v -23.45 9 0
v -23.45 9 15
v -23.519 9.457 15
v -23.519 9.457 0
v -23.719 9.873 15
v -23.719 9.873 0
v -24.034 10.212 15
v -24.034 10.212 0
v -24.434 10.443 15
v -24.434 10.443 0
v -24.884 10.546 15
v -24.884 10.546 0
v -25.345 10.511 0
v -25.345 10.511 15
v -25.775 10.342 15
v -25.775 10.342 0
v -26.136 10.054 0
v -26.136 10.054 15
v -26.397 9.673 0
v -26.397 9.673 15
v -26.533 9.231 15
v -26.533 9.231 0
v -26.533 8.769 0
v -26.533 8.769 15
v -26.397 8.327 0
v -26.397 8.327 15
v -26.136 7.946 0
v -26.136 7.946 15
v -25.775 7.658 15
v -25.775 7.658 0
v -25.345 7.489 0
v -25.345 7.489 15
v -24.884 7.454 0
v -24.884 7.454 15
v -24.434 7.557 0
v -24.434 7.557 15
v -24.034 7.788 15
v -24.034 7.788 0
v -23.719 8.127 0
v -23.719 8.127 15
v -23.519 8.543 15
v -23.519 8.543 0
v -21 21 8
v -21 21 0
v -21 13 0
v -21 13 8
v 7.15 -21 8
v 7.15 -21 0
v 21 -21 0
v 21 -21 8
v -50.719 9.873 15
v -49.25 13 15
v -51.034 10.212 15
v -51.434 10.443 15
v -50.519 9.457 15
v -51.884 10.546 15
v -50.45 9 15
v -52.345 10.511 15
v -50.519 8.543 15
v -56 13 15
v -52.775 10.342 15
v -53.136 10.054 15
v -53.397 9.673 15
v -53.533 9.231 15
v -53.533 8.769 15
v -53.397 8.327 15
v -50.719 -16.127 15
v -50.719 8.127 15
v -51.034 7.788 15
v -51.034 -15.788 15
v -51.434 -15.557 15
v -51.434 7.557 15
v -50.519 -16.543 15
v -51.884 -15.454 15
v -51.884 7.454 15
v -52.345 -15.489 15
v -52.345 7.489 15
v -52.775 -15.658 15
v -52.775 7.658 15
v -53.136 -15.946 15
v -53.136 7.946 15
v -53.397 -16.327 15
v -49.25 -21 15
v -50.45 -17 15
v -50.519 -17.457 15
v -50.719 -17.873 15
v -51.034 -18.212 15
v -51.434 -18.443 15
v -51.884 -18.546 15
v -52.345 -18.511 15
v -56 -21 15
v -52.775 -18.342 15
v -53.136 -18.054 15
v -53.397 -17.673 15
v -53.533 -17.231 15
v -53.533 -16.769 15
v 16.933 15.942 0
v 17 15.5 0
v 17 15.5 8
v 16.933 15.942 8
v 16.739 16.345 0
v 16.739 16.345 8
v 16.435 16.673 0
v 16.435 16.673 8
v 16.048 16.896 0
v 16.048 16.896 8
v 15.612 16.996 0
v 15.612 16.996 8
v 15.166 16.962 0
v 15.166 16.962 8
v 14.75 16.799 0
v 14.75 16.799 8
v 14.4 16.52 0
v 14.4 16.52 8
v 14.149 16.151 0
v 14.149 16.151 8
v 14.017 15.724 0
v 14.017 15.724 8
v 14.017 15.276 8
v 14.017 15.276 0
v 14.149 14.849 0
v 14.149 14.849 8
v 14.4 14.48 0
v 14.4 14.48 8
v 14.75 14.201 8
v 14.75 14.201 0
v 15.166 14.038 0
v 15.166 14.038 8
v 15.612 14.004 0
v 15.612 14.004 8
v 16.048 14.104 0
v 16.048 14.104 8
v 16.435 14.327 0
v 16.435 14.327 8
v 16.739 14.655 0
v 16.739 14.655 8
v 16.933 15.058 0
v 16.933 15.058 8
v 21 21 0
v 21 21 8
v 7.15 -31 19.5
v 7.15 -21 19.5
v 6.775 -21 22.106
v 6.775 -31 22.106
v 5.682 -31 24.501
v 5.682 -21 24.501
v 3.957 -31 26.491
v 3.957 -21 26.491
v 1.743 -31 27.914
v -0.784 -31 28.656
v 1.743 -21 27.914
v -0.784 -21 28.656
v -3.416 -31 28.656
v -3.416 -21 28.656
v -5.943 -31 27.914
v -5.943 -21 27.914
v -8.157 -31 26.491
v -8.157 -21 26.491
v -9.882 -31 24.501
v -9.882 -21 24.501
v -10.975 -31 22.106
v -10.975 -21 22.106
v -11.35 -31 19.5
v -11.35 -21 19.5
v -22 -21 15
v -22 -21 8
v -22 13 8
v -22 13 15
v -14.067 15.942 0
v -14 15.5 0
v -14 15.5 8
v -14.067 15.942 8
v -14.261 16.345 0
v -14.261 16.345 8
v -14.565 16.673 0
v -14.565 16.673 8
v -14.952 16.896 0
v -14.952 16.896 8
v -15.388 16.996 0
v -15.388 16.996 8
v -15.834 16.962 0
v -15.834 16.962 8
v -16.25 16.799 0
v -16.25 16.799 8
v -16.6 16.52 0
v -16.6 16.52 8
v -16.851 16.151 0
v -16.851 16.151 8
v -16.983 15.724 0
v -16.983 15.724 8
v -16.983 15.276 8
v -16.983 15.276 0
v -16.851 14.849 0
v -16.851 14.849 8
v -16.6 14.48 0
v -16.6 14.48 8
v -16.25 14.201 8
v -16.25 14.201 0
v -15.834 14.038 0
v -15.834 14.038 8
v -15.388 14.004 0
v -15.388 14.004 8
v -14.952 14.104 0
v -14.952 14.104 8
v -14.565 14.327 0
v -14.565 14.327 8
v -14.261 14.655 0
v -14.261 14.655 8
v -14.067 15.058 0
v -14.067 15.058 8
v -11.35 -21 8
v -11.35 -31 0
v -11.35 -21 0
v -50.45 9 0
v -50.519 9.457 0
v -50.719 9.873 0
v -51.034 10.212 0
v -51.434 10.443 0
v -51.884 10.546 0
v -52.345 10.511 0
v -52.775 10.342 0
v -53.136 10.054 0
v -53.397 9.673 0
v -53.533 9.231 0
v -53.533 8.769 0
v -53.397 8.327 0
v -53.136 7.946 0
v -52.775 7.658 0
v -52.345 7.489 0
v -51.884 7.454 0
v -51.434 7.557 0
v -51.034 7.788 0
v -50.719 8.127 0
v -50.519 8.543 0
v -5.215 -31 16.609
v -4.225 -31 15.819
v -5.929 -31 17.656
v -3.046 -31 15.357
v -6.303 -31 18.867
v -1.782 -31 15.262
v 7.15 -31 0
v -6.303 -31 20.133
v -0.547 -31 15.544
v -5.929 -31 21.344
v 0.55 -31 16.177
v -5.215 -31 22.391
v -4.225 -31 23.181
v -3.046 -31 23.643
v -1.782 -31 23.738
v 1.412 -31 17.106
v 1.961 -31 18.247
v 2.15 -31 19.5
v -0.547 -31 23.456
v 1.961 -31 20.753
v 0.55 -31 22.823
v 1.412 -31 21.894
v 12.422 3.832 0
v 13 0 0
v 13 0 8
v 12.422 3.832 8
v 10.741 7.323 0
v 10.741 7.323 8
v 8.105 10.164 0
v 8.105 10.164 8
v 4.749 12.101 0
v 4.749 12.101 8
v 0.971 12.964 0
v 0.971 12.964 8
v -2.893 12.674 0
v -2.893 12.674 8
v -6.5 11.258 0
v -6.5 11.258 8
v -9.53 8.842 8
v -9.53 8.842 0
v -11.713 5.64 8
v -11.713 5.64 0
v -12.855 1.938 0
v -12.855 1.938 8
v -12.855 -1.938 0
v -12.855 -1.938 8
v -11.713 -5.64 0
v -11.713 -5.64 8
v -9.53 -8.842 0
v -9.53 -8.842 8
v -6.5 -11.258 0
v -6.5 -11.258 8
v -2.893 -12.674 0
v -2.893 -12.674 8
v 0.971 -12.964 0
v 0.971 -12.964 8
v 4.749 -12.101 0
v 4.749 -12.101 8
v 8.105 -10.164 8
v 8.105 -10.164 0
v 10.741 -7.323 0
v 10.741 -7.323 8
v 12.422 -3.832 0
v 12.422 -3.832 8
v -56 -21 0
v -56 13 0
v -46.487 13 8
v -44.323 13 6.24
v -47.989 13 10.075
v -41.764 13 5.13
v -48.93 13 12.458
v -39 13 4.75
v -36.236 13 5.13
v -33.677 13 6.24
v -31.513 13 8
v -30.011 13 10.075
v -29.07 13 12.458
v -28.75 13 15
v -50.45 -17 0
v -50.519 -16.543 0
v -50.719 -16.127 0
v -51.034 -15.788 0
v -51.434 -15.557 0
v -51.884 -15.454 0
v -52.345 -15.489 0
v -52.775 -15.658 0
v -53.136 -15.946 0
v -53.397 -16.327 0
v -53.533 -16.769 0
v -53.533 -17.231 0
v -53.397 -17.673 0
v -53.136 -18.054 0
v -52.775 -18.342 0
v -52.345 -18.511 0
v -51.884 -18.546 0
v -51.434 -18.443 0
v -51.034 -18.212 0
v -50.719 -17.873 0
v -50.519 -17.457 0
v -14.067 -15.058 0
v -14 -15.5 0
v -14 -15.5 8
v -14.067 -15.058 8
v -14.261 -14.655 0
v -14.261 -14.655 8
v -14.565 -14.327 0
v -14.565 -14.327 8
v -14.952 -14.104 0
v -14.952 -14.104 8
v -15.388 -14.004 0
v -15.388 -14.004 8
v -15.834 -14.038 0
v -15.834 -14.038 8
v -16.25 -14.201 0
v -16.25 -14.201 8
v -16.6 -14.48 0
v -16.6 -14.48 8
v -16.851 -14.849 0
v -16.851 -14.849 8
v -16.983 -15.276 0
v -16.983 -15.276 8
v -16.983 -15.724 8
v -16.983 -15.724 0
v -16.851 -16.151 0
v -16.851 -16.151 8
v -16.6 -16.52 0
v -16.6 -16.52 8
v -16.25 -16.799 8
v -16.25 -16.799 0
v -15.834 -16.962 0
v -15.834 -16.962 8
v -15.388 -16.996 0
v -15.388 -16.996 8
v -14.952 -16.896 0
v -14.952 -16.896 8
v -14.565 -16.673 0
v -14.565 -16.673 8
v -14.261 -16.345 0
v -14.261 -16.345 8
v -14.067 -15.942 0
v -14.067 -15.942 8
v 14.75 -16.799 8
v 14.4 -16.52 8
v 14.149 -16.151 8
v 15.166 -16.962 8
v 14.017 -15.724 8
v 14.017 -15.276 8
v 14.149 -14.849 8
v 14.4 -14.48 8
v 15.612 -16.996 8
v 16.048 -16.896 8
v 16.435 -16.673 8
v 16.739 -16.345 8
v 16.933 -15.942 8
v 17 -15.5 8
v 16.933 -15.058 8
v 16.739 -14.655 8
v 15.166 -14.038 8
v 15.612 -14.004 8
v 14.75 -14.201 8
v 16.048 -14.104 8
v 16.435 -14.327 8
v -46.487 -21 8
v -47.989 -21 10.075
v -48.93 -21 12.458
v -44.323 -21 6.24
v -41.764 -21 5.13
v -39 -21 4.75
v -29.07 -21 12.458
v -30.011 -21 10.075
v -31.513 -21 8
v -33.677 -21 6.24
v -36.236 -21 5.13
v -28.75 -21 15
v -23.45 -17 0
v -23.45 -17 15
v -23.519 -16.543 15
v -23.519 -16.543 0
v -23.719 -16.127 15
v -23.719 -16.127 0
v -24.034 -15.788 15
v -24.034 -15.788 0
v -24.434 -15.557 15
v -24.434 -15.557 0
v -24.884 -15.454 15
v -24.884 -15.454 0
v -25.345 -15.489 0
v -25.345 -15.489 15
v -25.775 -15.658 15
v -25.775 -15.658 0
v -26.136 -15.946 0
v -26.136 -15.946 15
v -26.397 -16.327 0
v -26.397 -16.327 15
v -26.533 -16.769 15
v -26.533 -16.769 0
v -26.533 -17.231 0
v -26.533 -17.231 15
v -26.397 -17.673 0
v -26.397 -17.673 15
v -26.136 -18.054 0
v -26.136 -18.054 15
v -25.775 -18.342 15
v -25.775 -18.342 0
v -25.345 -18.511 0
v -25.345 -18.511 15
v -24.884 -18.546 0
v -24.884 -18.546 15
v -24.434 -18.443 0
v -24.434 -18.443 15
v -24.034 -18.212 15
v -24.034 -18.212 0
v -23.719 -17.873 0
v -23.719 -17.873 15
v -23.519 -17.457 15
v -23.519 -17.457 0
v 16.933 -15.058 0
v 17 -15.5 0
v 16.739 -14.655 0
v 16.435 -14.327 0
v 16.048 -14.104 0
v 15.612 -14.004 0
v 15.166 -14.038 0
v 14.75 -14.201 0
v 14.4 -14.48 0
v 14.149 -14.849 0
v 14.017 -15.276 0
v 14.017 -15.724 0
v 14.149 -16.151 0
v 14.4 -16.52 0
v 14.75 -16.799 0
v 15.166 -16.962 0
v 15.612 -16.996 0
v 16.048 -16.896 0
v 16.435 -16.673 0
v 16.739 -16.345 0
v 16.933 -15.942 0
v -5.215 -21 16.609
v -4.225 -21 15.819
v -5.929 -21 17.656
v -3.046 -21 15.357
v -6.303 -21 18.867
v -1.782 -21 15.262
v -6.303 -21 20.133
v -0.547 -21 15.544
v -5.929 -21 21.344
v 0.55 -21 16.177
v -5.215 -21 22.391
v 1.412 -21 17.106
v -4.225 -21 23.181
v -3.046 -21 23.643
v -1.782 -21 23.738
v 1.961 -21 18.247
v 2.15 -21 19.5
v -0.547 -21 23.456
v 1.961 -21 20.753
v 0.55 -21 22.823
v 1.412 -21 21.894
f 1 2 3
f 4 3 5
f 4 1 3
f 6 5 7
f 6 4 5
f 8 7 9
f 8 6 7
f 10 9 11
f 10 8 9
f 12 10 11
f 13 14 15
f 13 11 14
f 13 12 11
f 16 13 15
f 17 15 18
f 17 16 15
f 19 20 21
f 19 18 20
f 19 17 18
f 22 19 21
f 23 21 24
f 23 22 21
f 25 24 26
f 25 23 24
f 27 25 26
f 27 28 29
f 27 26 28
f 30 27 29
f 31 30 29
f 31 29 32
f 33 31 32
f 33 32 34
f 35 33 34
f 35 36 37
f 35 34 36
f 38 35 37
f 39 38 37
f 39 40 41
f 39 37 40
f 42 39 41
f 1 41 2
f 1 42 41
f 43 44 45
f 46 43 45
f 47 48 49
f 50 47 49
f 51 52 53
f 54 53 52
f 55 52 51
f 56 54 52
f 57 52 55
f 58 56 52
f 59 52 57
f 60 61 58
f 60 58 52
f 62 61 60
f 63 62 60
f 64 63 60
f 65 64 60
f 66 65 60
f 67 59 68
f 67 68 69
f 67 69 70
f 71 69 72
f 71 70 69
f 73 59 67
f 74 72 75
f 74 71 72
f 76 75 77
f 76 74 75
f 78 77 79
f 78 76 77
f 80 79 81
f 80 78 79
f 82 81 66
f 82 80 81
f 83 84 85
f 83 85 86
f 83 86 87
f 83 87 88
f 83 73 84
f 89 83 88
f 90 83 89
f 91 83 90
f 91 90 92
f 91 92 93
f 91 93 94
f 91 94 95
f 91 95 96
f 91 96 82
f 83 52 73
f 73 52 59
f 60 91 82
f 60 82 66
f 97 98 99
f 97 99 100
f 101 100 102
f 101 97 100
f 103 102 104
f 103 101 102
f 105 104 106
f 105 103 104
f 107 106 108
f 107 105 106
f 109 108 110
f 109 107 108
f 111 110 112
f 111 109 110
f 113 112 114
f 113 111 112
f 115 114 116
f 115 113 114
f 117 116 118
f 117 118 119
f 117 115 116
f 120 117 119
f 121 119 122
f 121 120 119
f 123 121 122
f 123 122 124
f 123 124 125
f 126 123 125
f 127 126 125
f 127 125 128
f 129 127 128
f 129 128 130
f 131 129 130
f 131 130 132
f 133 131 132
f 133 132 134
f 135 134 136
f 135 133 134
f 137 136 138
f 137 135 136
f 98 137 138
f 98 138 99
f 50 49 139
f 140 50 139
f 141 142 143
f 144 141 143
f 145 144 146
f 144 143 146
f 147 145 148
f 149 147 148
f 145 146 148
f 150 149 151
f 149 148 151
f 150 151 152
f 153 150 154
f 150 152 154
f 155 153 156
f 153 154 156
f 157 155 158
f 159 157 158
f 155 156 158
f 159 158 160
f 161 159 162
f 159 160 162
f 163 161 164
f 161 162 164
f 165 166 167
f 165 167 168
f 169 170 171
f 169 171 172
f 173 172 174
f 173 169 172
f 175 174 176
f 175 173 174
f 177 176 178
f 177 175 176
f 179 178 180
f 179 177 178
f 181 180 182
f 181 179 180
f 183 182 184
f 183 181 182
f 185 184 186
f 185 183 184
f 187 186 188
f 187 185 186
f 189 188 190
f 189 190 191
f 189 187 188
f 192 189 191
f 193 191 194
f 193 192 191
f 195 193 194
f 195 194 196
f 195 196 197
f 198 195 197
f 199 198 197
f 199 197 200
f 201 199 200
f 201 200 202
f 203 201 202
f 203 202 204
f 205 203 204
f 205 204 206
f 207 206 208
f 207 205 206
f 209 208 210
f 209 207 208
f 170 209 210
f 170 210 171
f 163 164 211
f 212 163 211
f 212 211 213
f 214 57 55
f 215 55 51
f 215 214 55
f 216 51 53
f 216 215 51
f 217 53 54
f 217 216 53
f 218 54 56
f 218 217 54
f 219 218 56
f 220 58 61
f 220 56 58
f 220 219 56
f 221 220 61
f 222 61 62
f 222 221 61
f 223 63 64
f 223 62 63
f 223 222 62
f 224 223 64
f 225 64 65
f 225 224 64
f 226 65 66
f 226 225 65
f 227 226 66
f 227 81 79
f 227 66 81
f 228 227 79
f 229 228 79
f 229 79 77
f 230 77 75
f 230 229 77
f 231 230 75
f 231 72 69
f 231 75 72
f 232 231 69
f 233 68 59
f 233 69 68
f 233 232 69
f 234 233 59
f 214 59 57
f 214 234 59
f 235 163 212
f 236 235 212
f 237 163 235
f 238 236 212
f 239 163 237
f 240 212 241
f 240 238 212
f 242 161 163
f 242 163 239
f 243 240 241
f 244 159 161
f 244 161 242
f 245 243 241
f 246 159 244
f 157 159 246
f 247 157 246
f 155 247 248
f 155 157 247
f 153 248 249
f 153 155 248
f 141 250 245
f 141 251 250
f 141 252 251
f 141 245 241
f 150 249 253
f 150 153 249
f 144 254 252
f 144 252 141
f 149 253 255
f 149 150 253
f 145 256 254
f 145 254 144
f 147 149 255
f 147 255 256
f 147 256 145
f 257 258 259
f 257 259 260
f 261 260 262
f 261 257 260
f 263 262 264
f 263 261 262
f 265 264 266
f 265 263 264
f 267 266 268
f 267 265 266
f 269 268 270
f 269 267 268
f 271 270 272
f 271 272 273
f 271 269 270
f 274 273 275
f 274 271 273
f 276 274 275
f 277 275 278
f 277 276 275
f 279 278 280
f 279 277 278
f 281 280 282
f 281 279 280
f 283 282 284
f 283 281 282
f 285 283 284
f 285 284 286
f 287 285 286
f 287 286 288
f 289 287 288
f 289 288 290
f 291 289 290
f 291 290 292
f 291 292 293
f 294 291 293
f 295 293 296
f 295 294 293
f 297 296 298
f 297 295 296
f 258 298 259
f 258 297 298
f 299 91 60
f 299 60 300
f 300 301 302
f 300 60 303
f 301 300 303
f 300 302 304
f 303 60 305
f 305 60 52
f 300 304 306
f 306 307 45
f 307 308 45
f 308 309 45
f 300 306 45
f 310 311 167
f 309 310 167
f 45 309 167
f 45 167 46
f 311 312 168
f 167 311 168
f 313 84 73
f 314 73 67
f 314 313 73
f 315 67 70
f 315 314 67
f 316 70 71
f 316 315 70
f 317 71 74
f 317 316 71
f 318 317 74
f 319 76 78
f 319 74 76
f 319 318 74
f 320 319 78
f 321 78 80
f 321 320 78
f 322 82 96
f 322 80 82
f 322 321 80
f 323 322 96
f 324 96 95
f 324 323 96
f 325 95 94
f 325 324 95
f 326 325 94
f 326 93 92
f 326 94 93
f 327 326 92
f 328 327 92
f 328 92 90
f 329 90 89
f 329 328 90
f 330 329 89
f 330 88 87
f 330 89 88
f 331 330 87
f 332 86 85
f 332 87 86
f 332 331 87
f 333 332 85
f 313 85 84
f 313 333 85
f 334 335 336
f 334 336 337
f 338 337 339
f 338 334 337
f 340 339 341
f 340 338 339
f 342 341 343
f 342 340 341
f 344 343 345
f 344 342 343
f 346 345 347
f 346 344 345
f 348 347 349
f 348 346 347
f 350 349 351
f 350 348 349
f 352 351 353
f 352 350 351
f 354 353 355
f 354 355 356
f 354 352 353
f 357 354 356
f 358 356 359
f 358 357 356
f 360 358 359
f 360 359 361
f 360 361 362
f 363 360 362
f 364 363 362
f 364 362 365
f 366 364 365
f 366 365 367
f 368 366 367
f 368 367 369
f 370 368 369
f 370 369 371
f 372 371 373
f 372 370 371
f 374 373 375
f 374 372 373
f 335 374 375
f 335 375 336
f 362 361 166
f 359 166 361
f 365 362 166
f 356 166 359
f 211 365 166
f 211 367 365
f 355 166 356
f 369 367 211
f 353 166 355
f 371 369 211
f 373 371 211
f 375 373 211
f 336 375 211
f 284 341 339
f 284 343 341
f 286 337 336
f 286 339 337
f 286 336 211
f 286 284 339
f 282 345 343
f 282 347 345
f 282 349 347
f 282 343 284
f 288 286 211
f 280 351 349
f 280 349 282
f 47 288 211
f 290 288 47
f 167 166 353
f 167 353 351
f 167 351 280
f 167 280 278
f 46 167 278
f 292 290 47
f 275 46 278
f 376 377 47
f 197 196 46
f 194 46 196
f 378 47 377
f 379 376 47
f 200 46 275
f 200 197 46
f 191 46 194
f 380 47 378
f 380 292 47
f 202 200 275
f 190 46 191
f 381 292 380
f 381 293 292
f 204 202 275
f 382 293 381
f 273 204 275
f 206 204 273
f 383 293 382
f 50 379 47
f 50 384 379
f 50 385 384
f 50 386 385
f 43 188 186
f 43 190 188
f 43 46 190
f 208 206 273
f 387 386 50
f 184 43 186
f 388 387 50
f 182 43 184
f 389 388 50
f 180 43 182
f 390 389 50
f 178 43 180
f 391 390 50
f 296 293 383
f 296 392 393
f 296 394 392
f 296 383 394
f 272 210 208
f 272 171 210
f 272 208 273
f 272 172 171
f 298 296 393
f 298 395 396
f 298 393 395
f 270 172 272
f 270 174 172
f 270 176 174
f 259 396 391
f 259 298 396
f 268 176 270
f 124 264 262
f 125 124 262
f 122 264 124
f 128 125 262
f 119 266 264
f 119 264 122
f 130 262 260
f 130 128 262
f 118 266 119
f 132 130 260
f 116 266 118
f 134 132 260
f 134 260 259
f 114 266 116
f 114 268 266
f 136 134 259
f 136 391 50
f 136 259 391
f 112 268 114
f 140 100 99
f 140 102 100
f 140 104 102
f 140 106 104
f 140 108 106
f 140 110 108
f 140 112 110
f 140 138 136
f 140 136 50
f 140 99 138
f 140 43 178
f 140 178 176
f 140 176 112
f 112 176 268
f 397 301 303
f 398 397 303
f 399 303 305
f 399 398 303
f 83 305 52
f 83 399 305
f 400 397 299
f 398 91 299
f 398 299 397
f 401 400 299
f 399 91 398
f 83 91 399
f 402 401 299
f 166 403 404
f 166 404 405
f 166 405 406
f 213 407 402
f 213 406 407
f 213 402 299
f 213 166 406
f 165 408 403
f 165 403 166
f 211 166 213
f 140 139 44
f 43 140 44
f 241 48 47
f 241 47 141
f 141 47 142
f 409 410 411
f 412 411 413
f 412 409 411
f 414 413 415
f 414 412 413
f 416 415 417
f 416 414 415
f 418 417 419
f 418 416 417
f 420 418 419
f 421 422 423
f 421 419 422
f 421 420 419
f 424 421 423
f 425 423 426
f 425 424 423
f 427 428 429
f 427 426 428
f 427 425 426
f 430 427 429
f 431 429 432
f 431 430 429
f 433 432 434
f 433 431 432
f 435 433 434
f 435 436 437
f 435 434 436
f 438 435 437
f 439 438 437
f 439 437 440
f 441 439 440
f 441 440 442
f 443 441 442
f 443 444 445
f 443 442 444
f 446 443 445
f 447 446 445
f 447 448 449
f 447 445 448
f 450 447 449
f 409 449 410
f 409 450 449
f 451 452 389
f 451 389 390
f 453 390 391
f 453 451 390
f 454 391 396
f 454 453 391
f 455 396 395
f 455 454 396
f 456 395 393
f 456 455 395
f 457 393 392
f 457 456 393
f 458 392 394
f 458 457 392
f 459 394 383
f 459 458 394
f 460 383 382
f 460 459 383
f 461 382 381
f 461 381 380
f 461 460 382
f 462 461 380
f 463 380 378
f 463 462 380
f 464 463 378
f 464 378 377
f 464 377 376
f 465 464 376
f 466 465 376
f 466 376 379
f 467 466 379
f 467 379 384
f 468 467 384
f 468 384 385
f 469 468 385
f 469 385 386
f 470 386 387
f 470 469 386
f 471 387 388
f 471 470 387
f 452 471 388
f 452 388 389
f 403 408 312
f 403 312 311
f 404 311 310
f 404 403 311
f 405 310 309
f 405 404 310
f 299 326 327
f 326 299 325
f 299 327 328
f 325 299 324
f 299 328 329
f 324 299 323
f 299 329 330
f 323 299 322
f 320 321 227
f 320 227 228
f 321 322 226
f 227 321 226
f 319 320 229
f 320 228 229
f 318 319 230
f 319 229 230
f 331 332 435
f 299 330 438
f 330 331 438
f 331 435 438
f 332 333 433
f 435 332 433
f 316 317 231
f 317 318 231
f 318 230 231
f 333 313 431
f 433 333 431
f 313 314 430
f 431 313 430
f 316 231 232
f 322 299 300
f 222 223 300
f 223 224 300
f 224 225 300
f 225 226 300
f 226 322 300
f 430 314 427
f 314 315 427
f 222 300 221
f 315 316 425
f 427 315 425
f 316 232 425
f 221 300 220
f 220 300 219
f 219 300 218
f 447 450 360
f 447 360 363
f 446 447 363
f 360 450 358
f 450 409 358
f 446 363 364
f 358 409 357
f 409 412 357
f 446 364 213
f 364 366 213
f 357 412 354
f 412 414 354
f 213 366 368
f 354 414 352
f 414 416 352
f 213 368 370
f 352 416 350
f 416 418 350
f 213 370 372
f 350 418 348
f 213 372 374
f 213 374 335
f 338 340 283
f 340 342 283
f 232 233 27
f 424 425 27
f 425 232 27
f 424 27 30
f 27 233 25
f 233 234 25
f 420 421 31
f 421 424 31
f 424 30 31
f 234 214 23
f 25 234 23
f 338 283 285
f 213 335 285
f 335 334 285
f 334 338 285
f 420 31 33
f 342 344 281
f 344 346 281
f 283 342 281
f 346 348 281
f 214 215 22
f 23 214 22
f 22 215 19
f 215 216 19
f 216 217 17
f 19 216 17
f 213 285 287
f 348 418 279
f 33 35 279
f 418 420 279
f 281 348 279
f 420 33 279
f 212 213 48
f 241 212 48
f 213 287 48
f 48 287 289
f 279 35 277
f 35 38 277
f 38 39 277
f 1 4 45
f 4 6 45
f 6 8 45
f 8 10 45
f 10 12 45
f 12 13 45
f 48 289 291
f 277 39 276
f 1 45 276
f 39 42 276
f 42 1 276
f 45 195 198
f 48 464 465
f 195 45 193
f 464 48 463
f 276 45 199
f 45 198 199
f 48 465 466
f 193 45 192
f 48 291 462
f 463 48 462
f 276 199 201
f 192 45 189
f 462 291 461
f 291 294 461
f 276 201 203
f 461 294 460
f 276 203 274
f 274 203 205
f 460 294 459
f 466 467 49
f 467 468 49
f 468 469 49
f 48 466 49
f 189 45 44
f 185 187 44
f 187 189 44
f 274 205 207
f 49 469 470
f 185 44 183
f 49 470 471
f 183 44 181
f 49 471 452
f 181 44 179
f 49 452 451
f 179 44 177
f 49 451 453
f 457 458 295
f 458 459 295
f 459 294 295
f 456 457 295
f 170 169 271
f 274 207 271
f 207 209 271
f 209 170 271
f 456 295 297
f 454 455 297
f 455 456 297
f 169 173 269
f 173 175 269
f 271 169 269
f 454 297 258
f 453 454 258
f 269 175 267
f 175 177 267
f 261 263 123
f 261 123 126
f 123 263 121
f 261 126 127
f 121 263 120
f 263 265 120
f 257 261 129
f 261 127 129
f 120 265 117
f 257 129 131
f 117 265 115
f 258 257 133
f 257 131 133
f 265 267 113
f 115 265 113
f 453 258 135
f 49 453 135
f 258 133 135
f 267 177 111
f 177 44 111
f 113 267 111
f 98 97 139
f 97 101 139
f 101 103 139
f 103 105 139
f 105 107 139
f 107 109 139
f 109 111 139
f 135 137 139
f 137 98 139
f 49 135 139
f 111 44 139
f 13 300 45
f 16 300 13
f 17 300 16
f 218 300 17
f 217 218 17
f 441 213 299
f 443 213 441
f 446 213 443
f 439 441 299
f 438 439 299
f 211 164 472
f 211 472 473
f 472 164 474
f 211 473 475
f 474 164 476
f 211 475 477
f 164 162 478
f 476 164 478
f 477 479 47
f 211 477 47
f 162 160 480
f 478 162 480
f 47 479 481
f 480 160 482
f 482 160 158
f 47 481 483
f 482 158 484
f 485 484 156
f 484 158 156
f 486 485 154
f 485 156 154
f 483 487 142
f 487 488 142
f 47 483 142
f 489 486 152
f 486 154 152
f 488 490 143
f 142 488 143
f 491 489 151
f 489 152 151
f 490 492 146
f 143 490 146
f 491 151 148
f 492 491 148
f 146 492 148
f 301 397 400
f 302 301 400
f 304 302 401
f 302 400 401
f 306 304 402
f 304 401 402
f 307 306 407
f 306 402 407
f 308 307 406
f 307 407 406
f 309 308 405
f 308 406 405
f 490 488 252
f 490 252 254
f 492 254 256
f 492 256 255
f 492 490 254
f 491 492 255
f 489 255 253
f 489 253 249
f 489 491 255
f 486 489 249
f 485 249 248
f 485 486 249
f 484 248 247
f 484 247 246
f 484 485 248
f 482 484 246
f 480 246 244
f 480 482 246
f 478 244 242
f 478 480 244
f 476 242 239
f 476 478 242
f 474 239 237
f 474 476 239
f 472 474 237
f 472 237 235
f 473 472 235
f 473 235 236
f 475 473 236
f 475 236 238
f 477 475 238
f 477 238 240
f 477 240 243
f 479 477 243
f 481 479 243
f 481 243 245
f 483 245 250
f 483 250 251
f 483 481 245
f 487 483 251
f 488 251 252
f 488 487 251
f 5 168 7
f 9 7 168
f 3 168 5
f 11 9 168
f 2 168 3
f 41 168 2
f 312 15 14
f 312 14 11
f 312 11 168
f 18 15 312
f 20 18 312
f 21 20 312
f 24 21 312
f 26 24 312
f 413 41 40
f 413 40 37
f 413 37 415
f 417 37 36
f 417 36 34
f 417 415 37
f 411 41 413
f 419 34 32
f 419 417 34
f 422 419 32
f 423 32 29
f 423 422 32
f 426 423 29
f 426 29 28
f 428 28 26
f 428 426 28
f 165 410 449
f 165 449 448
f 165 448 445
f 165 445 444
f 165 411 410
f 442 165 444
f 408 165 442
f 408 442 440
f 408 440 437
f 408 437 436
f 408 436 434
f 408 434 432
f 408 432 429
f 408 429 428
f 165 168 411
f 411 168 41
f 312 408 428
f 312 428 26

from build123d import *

# Parameters (mm, degrees)
F0_R     = 1.5
F0_R_2   = 13
F0_W     = 35
F0_H     = 34
F0_R_3   = 1.55
F1_DEPTH = 8
F2_W     = 18.5
F2_H     = 8
F2_R     = 4.25
F3_DEPTH = 10
F5_DEPTH = 34
F6_DEPTH = 42.001
F7_DEPTH = 28.751


with BuildPart() as f1:
    # F0 (on Top) → F1 (new body)
    with BuildSketch(Plane.XY):
        Polygon((21, 21), (-21, 21), (-21, 13), (-21, -21), (0, -21), (21, -21), (21, -16), align=None)
        with Locations((-15.5, -15.5)):
            Circle(F0_R, mode=Mode.SUBTRACT)
        with Locations((15.5, -15.5)):
            Circle(F0_R, mode=Mode.SUBTRACT)
        Circle(F0_R_2, mode=Mode.SUBTRACT)
        with Locations((-15.5, 15.5)):
            Circle(F0_R, mode=Mode.SUBTRACT)
        with Locations((15.5, 15.5)):
            Circle(F0_R, mode=Mode.SUBTRACT)
        with Locations((-38.5, -4)):
            Rectangle(F0_W, F0_H)
        with Locations((-52, -17)):
            Circle(F0_R_3, mode=Mode.SUBTRACT)
        with Locations((-25, -17)):
            Circle(F0_R_3, mode=Mode.SUBTRACT)
        with Locations((-52, 9)):
            Circle(F0_R_3, mode=Mode.SUBTRACT)
        with Locations((-25, 9)):
            Circle(F0_R_3, mode=Mode.SUBTRACT)
    extrude(amount=F1_DEPTH)

    # F2 (on face) → F3 (join)
    with BuildSketch(Plane.XZ.offset(21)):
        with Locations((-2.1, 4)):
            Rectangle(F2_W, F2_H)
        with BuildLine():
            Line((-11.35, 19.5), (-11.35, 8))
            Line((-11.35, 8), (7.15, 8))
            Line((7.15, 8), (7.15, 19.5))
            ThreePointArc((7.15, 19.5), (-2.1, 28.75), (-11.35, 19.5))
        make_face()
        with Locations((-2.1, 19.5)):
            Circle(F2_R, mode=Mode.SUBTRACT)
    extrude(amount=F3_DEPTH)

    # F4 (on face) → F5 (join, through all)
    with BuildSketch(Plane.XZ.offset(21)):
        with BuildLine():
            Line((-56, 15), (-56, 8))
            Line((-56, 8), (-46.4874895659, 8))
            ThreePointArc((-46.4874895659, 8), (-48.5343921686, 11.2373060217), (-49.25, 15))
            Line((-49.25, 15), (-56, 15))
        make_face()
        with BuildLine():
            ThreePointArc((-28.75, 15), (-29.4656078314, 11.2373060217), (-31.5125104341, 8))
            Line((-31.5125104341, 8), (-22, 8))
            Line((-22, 8), (-22, 15))
            Line((-22, 15), (-28.75, 15))
        make_face()
    extrude(amount=-F5_DEPTH)

    # F4 (on face) → F6 (cut, through all)
    with BuildSketch(Plane.XZ.offset(21)):
        with BuildLine():
            Line((-31.5125104341, 8), (-46.4874895659, 8))
            ThreePointArc((-46.4874895659, 8), (-39, 4.75), (-31.5125104341, 8))
        make_face()
    extrude(amount=-F6_DEPTH, mode=Mode.SUBTRACT)

    # F0 (on Top) → F7 (cut, through all)
    with BuildSketch(Plane.XY):
        with Locations((-52, -17)):
            Circle(F0_R_3)
        with Locations((-25, -17)):
            Circle(F0_R_3)
        with Locations((-25, 9)):
            Circle(F0_R_3)
        with Locations((-52, 9)):
            Circle(F0_R_3)
    extrude(amount=F7_DEPTH, mode=Mode.SUBTRACT)


solid = f1.part
